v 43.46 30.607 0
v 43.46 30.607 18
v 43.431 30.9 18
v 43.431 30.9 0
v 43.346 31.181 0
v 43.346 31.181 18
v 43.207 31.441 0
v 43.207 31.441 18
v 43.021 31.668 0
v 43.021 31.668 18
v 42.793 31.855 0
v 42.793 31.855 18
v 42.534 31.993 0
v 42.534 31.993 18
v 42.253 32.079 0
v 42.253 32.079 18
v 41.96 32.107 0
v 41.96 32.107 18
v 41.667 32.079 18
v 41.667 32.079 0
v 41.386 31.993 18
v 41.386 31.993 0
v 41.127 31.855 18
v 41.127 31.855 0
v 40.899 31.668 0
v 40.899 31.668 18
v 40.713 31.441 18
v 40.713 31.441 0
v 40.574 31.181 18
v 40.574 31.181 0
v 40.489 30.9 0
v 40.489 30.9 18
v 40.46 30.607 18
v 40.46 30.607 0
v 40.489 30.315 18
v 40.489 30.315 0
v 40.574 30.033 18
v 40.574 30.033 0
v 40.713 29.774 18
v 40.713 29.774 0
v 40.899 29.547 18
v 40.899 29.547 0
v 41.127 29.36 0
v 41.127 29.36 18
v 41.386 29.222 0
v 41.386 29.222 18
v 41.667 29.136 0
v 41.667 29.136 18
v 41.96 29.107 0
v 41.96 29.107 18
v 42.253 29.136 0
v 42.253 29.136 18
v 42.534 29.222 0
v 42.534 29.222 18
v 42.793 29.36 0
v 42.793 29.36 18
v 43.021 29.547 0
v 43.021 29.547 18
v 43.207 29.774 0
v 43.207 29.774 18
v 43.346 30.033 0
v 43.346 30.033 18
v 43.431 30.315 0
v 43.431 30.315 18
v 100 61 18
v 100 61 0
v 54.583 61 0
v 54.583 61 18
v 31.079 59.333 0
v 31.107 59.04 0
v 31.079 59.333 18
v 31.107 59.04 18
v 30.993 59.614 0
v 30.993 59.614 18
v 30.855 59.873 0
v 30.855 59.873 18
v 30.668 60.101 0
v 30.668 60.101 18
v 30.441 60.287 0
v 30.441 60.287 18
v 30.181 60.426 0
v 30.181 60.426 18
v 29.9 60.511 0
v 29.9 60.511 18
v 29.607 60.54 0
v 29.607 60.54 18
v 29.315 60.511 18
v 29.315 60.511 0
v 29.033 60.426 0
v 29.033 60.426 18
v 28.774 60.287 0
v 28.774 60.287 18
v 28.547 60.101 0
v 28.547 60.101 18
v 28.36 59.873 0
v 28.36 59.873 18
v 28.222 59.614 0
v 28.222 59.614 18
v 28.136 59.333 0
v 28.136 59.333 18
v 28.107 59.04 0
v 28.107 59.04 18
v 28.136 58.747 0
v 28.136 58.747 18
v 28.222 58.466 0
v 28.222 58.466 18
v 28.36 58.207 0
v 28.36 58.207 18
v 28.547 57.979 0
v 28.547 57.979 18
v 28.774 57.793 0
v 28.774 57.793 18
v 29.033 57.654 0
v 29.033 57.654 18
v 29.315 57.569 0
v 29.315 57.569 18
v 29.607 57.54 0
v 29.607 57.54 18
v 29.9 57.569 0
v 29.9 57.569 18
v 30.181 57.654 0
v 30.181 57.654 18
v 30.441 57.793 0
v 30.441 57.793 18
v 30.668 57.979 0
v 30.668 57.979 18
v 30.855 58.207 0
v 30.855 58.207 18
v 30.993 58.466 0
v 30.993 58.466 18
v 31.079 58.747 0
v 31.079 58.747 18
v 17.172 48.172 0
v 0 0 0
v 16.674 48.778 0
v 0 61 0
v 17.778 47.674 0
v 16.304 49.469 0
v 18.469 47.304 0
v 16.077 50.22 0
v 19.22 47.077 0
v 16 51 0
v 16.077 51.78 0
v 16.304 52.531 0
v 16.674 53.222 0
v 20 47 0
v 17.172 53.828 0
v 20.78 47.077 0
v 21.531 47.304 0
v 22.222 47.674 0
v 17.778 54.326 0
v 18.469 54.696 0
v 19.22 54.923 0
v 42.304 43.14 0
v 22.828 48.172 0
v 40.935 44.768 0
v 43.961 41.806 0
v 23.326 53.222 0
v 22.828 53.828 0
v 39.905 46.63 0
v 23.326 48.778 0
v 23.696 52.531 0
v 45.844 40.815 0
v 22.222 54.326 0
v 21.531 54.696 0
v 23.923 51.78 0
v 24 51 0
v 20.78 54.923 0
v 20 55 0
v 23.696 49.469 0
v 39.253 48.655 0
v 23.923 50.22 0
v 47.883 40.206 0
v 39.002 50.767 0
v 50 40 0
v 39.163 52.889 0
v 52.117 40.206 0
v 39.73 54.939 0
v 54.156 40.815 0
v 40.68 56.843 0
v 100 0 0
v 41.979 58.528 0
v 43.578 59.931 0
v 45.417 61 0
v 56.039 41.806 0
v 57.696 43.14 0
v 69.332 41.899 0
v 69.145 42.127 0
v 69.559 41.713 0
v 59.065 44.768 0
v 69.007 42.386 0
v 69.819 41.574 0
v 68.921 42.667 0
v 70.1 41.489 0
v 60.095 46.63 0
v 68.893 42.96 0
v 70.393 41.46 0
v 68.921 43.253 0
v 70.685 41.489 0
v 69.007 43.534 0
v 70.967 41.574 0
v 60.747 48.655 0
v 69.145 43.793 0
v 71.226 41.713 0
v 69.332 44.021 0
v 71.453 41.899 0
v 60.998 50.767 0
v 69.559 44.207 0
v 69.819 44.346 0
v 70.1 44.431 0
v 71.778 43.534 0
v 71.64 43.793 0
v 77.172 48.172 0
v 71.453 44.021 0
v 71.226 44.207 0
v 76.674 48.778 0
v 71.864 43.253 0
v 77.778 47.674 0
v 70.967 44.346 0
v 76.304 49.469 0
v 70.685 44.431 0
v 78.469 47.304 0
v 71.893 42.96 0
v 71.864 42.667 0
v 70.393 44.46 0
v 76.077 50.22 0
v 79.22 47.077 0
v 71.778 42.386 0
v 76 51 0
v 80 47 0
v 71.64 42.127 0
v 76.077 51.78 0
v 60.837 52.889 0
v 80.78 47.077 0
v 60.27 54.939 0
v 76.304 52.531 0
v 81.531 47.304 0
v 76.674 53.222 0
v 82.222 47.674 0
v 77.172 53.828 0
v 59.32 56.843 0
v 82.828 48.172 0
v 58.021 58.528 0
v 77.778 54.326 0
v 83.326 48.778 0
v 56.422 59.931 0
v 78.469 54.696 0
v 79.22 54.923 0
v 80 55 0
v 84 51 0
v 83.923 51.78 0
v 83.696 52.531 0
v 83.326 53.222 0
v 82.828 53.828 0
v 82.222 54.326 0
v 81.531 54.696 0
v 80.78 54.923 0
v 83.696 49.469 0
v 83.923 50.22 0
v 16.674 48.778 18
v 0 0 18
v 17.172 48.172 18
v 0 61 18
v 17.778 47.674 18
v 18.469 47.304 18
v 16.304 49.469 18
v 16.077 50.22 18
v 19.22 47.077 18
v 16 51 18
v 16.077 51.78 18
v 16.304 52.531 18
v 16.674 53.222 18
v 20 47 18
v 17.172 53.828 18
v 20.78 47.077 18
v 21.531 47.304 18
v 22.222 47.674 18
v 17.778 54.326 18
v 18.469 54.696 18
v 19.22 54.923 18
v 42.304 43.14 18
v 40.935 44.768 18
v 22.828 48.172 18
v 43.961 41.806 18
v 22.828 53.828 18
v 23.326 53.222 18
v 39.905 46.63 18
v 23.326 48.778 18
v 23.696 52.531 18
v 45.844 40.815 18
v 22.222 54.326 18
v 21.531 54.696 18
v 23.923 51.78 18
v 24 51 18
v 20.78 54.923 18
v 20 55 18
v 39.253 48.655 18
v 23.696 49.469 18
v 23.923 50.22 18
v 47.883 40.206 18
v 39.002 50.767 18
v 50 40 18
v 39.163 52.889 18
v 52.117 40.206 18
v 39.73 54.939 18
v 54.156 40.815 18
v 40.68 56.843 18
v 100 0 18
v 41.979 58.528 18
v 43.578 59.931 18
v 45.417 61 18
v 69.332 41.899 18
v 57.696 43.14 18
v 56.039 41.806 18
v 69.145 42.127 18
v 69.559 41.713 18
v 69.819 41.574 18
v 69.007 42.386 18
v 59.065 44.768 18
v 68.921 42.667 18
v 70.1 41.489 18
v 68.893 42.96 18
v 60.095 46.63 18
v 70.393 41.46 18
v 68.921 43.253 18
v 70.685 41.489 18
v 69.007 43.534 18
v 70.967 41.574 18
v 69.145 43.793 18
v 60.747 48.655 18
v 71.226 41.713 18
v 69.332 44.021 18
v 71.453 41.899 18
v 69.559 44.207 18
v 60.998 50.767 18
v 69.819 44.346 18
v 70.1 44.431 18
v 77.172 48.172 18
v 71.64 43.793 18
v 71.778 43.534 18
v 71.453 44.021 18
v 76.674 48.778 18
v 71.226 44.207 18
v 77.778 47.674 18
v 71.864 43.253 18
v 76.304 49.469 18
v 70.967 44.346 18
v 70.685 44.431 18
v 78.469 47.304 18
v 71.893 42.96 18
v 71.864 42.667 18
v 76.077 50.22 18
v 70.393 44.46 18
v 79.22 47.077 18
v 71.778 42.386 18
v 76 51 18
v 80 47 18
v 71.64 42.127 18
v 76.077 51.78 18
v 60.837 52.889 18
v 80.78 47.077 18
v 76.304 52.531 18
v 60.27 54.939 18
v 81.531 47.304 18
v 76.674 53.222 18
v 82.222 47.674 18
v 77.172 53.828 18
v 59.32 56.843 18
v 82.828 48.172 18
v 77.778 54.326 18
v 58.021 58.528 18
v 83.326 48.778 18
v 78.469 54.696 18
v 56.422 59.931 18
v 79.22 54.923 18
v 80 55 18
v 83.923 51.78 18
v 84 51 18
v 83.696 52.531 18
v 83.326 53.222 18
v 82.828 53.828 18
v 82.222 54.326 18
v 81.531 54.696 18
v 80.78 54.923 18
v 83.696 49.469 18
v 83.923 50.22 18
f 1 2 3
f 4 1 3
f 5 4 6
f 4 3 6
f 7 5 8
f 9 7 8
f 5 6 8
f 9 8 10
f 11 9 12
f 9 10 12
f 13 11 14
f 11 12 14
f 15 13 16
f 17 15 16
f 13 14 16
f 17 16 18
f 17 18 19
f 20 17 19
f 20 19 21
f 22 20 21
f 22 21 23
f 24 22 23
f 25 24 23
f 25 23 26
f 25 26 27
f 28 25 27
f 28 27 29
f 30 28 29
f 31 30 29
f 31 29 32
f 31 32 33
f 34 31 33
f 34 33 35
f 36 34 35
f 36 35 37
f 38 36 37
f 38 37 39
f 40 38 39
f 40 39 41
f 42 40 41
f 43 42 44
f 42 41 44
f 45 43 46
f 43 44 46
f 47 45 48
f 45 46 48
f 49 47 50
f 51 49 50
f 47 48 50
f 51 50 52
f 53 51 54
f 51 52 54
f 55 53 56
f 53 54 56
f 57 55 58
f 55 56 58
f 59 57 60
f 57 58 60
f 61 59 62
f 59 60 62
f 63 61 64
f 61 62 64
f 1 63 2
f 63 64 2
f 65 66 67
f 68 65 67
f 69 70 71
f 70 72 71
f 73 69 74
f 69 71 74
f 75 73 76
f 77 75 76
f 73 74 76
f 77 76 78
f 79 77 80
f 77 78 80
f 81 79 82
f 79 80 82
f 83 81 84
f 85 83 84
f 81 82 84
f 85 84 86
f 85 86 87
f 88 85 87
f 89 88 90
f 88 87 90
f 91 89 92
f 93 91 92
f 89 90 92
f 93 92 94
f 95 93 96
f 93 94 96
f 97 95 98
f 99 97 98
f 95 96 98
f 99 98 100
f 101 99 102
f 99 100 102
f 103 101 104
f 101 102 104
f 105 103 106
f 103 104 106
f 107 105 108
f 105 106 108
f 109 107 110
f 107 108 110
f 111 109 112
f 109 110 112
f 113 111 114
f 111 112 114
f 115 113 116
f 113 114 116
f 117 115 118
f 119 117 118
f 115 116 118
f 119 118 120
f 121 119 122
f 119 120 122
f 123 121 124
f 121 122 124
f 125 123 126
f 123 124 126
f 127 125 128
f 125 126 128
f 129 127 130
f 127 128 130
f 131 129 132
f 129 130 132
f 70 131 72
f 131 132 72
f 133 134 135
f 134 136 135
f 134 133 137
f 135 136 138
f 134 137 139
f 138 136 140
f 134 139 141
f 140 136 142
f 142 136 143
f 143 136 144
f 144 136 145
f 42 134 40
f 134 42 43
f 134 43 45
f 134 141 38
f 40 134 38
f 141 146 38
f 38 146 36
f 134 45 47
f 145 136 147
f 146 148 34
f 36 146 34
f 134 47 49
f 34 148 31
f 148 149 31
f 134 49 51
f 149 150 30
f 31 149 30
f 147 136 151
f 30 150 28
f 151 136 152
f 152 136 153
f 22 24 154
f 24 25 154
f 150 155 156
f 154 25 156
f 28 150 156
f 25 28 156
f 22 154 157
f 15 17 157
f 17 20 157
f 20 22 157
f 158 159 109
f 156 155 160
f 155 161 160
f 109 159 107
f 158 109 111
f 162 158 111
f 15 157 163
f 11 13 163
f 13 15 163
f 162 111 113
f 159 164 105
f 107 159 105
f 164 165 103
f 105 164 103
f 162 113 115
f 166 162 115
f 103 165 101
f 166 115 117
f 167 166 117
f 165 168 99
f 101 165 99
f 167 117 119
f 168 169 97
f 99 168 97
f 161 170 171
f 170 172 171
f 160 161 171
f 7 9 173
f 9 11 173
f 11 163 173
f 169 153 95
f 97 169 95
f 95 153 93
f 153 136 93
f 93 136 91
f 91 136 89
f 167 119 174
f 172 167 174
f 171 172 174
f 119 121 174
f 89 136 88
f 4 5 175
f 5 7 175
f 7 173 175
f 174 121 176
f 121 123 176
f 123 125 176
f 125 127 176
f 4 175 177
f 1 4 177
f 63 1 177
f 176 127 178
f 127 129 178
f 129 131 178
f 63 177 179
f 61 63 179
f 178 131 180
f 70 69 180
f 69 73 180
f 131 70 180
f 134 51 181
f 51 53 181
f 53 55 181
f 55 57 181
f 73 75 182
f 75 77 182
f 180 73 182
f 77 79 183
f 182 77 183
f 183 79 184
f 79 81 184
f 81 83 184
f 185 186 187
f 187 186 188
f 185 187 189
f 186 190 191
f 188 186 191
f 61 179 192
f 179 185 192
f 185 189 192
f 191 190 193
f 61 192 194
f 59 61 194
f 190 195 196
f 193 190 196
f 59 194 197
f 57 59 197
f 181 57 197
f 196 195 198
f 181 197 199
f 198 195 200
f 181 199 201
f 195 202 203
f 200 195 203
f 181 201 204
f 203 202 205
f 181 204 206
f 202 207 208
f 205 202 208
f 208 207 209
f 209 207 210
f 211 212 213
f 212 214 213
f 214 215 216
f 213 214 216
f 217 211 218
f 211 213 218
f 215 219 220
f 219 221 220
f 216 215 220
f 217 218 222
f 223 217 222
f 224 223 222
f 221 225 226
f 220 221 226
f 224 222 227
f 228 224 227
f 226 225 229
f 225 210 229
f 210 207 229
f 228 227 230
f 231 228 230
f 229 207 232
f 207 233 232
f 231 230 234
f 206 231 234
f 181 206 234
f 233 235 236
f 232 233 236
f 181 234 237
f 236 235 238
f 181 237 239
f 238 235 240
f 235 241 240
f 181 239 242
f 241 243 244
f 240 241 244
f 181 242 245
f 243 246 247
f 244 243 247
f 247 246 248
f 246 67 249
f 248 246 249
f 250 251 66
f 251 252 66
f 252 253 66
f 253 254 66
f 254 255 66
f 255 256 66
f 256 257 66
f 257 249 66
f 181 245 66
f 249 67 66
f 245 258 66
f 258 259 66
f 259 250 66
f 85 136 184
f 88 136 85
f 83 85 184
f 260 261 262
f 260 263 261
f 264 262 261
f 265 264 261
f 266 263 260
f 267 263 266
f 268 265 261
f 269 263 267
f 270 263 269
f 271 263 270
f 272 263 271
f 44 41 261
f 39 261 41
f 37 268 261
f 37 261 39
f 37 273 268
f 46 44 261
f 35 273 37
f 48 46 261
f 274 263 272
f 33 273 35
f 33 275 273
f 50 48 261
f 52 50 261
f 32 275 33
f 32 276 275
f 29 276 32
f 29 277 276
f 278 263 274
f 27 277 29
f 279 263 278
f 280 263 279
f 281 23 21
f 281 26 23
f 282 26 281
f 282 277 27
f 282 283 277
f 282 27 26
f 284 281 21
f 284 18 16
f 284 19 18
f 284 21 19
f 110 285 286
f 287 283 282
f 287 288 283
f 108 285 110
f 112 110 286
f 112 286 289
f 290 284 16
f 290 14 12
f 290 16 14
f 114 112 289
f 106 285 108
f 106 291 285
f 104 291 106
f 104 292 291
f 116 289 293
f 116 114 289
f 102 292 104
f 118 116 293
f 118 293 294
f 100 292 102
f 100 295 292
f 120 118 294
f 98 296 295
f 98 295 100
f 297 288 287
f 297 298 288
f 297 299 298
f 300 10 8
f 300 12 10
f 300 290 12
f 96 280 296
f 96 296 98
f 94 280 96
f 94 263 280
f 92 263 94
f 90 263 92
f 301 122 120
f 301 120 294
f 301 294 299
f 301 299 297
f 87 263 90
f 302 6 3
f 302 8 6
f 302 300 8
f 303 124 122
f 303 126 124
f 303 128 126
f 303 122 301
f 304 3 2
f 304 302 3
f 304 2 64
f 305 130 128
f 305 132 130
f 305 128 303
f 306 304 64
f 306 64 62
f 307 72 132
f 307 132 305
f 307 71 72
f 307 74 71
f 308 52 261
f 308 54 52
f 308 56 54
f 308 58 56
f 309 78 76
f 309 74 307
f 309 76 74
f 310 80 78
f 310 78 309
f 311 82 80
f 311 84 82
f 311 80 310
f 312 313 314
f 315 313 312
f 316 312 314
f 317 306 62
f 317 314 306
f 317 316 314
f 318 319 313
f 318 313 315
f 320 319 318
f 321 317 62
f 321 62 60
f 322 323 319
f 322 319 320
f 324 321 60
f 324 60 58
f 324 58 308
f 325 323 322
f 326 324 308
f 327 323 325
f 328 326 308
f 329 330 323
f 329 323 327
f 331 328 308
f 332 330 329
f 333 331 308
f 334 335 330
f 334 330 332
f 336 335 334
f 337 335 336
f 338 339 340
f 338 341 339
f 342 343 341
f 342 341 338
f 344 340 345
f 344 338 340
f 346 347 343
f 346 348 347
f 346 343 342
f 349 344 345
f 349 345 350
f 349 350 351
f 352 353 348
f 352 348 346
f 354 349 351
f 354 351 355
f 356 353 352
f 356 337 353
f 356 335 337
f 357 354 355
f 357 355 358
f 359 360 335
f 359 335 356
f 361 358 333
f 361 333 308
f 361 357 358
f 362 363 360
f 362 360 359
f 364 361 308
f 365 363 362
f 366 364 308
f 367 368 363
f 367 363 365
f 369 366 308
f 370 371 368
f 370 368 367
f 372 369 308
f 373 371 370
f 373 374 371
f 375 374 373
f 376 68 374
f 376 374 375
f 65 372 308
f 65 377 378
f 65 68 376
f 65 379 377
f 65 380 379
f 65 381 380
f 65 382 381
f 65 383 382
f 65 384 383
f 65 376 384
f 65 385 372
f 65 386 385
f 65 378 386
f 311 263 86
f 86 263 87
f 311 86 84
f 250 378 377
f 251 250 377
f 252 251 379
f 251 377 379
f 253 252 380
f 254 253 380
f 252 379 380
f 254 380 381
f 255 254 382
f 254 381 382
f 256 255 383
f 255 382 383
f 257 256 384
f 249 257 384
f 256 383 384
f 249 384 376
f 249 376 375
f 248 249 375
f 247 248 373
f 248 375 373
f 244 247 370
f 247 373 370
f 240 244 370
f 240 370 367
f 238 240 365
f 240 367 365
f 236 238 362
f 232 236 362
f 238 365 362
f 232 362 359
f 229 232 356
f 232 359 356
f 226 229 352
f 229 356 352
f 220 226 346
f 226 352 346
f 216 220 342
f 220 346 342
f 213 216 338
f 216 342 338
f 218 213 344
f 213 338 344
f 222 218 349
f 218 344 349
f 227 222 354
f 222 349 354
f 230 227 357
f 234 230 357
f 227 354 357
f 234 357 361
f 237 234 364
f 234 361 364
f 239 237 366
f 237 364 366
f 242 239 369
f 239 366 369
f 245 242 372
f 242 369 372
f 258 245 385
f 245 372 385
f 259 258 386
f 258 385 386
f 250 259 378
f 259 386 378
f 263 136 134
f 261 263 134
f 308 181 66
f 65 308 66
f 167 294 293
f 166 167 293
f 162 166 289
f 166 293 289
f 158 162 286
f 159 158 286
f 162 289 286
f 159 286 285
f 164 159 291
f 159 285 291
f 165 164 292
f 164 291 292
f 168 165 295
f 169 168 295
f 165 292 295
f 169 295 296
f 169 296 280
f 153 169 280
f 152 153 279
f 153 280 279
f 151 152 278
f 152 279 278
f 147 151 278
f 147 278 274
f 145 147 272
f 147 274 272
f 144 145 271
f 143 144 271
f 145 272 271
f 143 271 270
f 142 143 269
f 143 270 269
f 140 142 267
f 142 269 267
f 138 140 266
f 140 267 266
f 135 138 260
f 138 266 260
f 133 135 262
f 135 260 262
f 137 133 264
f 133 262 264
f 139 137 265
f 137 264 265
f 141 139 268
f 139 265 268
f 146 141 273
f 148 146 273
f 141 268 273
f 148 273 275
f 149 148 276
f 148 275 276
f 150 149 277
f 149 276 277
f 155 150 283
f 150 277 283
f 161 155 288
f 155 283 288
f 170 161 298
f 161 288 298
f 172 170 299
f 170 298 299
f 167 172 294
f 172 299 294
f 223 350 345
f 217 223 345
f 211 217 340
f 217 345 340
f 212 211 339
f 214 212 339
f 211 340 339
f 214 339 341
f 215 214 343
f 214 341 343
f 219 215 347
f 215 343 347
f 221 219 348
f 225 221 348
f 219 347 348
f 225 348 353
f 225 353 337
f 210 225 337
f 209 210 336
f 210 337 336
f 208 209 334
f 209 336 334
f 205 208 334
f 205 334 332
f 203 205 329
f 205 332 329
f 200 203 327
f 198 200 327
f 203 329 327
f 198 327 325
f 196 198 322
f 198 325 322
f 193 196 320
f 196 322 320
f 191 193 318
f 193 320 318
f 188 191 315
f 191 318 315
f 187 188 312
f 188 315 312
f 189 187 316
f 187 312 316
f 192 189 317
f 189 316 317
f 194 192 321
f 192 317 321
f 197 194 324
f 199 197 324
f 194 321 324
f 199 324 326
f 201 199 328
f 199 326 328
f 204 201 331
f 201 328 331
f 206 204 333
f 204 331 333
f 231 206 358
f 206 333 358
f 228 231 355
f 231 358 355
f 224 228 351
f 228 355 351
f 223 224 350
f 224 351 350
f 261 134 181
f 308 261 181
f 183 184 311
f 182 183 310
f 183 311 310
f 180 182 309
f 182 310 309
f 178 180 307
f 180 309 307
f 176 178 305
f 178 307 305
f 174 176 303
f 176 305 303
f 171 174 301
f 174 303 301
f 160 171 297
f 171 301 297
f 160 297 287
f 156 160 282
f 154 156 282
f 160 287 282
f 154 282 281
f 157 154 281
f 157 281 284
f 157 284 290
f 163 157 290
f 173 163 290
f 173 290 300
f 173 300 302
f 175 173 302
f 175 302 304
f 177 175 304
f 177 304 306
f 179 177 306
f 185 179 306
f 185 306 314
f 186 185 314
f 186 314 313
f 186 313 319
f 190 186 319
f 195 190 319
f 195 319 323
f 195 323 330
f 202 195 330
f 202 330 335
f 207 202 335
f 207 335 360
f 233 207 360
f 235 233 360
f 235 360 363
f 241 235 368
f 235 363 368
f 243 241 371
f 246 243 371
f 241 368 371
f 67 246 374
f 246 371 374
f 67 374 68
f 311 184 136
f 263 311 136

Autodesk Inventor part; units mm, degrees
ref_plane "YZ Plane" through (0, 0, 0) normal (1, 0, 0) x (0, 1, 0)
ref_plane "XZ Plane" through (0, 0, 0) normal (0, 1, 0) x (-1, 0, 0)
ref_plane "XY Plane" through (0, 0, 0) normal (0, 0, 1) x (1, 0, 0)
sketch "Boceto1" plane through (0, 0, 0) normal (0, 0, 1) x (1, 0, 0)
  line L0 (0, 0) -> (100, 0)
  line L1 (100, 0) -> (100, 61)
  line L2 (100, 61) -> (0, 61)
  line L3 (0, 61) -> (0, 0)
  dimension "d0" = 61
  dimension "d1" = 100
extrude "Extrusión1" add sketch "Boceto1" along normal blind 18
sketch "Boceto2" plane through (0, 0, 18) normal (0, 0, 1) x (1, 0, 0)
  circle A0 centre (50, 51) radius 11
  line L0 (0, 61) -> (0, 0) projected
  line L1 (100, 61) -> (0, 61) projected
  line L2 (50, 51) -> (20, 51) construction
  circle A1 centre (20, 51) radius 4
  line L3 (50, 51) -> (50, 22.8333) construction
  circle A2 centre (80, 51) radius 4
  circle A3 centre (29.6074, 59.04) radius 1.5
  line L4 (29.6074, 59.04) -> (50, 51) construction
  line L5 (50, 51) -> (78.7272, 39.674) construction
  circle A4 centre (70.3926, 42.96) radius 1.5
  line L6 (50, 51) -> (39.3624, 24.0188) construction
  circle A5 centre (41.96, 30.6074) radius 1.5
  line L7 (50, 51) -> (25.0918, 40.1786)
  line L8 (50, 51) -> (59.4119, 29.3362)
  point P0 (54.5826, 61)
  point P1 (45.4174, 61)
  dimension "d4" = 22
  dimension "d5" = 50
  dimension "d6" = 10
  dimension "d7" = 8
  dimension "d8" = 30
  dimension "d9" = 3
  dimension "d10" = 1.96
  dimension "d12" = 3
  dimension "d13" = 90
  dimension "d14" = 3
  dimension "d17" = 45
  dimension "d18" = 15.5
  dimension "d19" = 15.5
  dimension "d20" = 45
  dimension "d21" = 15.5
extrude "Extrusión2" cut sketch "Boceto2" against normal blind 18 contours A0 L8 L7 L1 | A0 L7 L8 | A1 | A2 | A3 | A4 | A5
properties part number "012" material "CFRP"
